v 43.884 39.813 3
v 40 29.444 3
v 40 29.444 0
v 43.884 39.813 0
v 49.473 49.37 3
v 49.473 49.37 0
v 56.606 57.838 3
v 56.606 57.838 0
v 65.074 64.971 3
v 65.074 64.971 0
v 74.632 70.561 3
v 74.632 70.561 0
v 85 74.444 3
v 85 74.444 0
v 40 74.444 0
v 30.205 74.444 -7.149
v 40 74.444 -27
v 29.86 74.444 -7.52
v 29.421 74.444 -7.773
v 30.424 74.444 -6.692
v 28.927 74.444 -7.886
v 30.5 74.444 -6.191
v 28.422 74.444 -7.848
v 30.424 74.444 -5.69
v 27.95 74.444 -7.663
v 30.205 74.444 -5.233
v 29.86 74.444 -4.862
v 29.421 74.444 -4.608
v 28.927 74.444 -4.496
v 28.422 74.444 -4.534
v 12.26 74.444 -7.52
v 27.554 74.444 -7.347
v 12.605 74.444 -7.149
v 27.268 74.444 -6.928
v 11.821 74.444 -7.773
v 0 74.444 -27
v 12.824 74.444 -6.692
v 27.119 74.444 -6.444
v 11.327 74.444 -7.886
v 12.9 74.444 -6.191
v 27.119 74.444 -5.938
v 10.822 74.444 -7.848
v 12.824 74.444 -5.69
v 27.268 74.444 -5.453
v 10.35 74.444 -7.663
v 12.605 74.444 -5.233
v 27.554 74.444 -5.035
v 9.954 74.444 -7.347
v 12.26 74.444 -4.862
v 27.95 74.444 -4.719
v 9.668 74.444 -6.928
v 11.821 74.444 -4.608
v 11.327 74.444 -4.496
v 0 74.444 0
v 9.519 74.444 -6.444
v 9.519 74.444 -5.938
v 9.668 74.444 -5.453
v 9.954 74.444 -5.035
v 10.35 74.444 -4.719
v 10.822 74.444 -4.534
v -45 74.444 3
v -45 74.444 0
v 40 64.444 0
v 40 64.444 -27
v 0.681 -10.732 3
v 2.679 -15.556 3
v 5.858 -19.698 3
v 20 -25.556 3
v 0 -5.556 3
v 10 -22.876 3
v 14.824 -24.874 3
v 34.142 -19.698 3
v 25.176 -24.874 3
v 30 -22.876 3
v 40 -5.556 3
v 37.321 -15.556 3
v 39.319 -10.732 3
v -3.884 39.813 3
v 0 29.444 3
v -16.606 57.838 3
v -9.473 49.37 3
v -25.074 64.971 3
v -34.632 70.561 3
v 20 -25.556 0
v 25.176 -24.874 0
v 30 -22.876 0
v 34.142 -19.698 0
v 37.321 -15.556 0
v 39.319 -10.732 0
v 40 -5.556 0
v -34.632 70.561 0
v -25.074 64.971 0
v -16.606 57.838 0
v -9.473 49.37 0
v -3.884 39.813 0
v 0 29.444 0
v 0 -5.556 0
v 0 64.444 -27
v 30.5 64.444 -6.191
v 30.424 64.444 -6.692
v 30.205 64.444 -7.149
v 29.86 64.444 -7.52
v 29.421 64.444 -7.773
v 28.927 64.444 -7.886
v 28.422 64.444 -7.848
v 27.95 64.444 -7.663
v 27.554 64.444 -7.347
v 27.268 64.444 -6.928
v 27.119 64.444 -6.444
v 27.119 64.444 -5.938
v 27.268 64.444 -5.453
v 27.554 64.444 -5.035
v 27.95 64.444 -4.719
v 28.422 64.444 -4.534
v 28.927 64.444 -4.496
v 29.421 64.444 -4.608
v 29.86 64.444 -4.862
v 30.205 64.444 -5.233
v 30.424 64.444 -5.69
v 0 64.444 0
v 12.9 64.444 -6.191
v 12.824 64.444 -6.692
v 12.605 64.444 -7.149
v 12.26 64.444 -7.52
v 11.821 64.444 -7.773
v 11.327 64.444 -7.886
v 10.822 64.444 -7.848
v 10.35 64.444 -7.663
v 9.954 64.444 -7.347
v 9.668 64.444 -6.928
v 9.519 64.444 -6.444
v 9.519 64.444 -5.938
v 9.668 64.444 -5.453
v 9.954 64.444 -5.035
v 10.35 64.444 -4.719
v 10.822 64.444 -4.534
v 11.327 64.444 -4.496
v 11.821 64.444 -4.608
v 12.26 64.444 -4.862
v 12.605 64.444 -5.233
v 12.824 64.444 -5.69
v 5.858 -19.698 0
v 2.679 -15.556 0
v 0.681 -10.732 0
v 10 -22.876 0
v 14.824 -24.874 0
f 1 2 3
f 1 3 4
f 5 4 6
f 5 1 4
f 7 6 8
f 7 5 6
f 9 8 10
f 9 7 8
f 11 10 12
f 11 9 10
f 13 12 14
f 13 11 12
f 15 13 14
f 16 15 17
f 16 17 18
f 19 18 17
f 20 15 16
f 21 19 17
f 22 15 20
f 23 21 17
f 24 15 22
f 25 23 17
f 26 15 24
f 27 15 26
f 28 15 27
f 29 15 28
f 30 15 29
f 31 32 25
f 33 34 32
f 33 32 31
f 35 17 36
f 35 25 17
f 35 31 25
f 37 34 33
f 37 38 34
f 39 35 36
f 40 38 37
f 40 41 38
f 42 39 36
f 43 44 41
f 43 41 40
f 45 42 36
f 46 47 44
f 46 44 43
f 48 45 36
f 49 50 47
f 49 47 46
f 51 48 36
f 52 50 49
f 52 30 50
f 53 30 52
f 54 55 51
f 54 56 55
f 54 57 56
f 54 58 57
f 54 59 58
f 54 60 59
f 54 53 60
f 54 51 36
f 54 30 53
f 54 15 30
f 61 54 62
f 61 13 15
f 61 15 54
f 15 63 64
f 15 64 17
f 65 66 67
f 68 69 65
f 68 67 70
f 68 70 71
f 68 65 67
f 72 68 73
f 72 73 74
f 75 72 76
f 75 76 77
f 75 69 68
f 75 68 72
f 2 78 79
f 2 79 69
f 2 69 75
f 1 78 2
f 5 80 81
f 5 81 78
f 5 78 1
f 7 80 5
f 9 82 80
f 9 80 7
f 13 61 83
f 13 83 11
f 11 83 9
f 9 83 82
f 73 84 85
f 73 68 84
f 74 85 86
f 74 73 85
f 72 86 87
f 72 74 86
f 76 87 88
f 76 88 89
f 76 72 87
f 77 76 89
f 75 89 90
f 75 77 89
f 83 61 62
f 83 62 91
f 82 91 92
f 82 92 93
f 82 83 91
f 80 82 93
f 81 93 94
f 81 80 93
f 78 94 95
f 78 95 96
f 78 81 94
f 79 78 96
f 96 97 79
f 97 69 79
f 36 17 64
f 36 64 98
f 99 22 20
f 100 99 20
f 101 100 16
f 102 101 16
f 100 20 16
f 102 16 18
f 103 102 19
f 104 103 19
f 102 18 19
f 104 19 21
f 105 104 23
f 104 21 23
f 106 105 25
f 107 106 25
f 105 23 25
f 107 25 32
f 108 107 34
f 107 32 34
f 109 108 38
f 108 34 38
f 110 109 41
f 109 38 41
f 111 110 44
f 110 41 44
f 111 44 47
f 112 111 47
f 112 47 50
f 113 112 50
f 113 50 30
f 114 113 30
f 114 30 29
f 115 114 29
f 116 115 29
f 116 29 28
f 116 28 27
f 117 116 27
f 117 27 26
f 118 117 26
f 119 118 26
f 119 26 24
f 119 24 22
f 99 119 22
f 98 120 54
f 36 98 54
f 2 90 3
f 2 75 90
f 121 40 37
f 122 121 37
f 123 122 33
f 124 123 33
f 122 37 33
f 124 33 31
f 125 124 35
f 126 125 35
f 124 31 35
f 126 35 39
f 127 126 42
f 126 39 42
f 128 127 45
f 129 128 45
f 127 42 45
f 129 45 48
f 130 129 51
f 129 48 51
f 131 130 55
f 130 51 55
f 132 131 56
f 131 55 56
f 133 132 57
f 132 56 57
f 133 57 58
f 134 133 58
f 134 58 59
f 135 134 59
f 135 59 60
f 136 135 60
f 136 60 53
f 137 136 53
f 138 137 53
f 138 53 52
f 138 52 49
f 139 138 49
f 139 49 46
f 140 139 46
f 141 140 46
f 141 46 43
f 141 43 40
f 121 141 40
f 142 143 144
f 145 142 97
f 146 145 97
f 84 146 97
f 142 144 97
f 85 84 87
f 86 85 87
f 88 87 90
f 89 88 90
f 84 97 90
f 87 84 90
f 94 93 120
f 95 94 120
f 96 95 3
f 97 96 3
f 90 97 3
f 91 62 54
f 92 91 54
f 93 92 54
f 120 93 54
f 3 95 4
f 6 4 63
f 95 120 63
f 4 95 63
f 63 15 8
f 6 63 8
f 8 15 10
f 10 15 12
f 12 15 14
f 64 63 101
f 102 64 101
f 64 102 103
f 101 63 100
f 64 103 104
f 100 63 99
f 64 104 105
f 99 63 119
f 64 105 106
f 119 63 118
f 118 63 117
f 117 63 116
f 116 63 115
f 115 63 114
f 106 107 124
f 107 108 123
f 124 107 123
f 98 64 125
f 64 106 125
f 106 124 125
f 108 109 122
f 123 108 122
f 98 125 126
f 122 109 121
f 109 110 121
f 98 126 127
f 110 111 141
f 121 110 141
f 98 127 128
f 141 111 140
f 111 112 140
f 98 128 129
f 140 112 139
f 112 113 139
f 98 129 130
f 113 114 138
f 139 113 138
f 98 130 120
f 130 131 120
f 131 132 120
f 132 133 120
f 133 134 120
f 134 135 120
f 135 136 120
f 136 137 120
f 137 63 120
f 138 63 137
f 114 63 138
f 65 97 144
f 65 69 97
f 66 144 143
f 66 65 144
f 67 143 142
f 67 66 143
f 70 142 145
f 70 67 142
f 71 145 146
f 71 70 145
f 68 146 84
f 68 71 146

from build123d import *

# Parameters (mm, degrees)
SKETCH1_W            = 40
SKETCH1_H            = 100
BOSS_EXTRUDE1_DEPTH  = 3
FILLET1_R            = 20
SKETCH2_W            = 40
SKETCH2_H            = 10
BOSS_EXTRUDE2_DEPTH  = 27
M3_CLEARANCE_HOLE1_D = 3.4
BOSS_EXTRUDE4_DEPTH  = 3


with BuildPart() as part:
    # Sketch1 → Boss-Extrude1 (new body)
    with BuildSketch(Plane.XY):
        with Locations((20, 24.444444444)):
            Rectangle(SKETCH1_W, SKETCH1_H)
    extrude(amount=BOSS_EXTRUDE1_DEPTH)

    # Fillet1
    fillet1_edges = [part.edges().sort_by_distance(p)[0] for p in [
        (40, -25.555555556, 1.5),
        (0, -25.555555556, 1.5),
    ]]
    fillet(fillet1_edges, radius=FILLET1_R - 0.0001)  # a hair under: the kernel refuses the full size

    # Sketch2 → Boss-Extrude2 (add)
    with BuildSketch(Plane(origin=(0, 0, 0), x_dir=(-1, 0, 0), z_dir=(0, 0, -1))):
        with Locations((-20, 69.444444444)):
            Rectangle(SKETCH2_W, SKETCH2_H)
    extrude(amount=BOSS_EXTRUDE2_DEPTH)

    # M3 Clearance Hole1 (through all)
    with Locations(Plane(origin=(0, 64.444444444, 0), x_dir=(-1, 0, 0), z_dir=(0, -1, 0))):
        with Locations((-28.8, 6.190883488), (-11.2, 6.190883488)):
            Hole(M3_CLEARANCE_HOLE1_D / 2)

    # Sketch15 → Boss-Extrude4 (add)
    with BuildSketch(Plane.XY.offset(3)):
        with BuildLine():
            Line((85, 74.444444444), (40, 74.444444444))
            Line((40, 74.444444444), (40, 29.444444444))
            ThreePointArc((40, 29.444444444), (56.606100623, 57.838343821), (85, 74.444444444))
        make_face()
        with BuildLine():
            Line((0, 29.444444444), (0, 74.444444444))
            Line((0, 74.444444444), (-45, 74.444444444))
            ThreePointArc((-45, 74.444444444), (-16.606100623, 57.838343821), (0, 29.444444444))
        make_face()
    extrude(amount=-BOSS_EXTRUDE4_DEPTH)


solid = part.part
